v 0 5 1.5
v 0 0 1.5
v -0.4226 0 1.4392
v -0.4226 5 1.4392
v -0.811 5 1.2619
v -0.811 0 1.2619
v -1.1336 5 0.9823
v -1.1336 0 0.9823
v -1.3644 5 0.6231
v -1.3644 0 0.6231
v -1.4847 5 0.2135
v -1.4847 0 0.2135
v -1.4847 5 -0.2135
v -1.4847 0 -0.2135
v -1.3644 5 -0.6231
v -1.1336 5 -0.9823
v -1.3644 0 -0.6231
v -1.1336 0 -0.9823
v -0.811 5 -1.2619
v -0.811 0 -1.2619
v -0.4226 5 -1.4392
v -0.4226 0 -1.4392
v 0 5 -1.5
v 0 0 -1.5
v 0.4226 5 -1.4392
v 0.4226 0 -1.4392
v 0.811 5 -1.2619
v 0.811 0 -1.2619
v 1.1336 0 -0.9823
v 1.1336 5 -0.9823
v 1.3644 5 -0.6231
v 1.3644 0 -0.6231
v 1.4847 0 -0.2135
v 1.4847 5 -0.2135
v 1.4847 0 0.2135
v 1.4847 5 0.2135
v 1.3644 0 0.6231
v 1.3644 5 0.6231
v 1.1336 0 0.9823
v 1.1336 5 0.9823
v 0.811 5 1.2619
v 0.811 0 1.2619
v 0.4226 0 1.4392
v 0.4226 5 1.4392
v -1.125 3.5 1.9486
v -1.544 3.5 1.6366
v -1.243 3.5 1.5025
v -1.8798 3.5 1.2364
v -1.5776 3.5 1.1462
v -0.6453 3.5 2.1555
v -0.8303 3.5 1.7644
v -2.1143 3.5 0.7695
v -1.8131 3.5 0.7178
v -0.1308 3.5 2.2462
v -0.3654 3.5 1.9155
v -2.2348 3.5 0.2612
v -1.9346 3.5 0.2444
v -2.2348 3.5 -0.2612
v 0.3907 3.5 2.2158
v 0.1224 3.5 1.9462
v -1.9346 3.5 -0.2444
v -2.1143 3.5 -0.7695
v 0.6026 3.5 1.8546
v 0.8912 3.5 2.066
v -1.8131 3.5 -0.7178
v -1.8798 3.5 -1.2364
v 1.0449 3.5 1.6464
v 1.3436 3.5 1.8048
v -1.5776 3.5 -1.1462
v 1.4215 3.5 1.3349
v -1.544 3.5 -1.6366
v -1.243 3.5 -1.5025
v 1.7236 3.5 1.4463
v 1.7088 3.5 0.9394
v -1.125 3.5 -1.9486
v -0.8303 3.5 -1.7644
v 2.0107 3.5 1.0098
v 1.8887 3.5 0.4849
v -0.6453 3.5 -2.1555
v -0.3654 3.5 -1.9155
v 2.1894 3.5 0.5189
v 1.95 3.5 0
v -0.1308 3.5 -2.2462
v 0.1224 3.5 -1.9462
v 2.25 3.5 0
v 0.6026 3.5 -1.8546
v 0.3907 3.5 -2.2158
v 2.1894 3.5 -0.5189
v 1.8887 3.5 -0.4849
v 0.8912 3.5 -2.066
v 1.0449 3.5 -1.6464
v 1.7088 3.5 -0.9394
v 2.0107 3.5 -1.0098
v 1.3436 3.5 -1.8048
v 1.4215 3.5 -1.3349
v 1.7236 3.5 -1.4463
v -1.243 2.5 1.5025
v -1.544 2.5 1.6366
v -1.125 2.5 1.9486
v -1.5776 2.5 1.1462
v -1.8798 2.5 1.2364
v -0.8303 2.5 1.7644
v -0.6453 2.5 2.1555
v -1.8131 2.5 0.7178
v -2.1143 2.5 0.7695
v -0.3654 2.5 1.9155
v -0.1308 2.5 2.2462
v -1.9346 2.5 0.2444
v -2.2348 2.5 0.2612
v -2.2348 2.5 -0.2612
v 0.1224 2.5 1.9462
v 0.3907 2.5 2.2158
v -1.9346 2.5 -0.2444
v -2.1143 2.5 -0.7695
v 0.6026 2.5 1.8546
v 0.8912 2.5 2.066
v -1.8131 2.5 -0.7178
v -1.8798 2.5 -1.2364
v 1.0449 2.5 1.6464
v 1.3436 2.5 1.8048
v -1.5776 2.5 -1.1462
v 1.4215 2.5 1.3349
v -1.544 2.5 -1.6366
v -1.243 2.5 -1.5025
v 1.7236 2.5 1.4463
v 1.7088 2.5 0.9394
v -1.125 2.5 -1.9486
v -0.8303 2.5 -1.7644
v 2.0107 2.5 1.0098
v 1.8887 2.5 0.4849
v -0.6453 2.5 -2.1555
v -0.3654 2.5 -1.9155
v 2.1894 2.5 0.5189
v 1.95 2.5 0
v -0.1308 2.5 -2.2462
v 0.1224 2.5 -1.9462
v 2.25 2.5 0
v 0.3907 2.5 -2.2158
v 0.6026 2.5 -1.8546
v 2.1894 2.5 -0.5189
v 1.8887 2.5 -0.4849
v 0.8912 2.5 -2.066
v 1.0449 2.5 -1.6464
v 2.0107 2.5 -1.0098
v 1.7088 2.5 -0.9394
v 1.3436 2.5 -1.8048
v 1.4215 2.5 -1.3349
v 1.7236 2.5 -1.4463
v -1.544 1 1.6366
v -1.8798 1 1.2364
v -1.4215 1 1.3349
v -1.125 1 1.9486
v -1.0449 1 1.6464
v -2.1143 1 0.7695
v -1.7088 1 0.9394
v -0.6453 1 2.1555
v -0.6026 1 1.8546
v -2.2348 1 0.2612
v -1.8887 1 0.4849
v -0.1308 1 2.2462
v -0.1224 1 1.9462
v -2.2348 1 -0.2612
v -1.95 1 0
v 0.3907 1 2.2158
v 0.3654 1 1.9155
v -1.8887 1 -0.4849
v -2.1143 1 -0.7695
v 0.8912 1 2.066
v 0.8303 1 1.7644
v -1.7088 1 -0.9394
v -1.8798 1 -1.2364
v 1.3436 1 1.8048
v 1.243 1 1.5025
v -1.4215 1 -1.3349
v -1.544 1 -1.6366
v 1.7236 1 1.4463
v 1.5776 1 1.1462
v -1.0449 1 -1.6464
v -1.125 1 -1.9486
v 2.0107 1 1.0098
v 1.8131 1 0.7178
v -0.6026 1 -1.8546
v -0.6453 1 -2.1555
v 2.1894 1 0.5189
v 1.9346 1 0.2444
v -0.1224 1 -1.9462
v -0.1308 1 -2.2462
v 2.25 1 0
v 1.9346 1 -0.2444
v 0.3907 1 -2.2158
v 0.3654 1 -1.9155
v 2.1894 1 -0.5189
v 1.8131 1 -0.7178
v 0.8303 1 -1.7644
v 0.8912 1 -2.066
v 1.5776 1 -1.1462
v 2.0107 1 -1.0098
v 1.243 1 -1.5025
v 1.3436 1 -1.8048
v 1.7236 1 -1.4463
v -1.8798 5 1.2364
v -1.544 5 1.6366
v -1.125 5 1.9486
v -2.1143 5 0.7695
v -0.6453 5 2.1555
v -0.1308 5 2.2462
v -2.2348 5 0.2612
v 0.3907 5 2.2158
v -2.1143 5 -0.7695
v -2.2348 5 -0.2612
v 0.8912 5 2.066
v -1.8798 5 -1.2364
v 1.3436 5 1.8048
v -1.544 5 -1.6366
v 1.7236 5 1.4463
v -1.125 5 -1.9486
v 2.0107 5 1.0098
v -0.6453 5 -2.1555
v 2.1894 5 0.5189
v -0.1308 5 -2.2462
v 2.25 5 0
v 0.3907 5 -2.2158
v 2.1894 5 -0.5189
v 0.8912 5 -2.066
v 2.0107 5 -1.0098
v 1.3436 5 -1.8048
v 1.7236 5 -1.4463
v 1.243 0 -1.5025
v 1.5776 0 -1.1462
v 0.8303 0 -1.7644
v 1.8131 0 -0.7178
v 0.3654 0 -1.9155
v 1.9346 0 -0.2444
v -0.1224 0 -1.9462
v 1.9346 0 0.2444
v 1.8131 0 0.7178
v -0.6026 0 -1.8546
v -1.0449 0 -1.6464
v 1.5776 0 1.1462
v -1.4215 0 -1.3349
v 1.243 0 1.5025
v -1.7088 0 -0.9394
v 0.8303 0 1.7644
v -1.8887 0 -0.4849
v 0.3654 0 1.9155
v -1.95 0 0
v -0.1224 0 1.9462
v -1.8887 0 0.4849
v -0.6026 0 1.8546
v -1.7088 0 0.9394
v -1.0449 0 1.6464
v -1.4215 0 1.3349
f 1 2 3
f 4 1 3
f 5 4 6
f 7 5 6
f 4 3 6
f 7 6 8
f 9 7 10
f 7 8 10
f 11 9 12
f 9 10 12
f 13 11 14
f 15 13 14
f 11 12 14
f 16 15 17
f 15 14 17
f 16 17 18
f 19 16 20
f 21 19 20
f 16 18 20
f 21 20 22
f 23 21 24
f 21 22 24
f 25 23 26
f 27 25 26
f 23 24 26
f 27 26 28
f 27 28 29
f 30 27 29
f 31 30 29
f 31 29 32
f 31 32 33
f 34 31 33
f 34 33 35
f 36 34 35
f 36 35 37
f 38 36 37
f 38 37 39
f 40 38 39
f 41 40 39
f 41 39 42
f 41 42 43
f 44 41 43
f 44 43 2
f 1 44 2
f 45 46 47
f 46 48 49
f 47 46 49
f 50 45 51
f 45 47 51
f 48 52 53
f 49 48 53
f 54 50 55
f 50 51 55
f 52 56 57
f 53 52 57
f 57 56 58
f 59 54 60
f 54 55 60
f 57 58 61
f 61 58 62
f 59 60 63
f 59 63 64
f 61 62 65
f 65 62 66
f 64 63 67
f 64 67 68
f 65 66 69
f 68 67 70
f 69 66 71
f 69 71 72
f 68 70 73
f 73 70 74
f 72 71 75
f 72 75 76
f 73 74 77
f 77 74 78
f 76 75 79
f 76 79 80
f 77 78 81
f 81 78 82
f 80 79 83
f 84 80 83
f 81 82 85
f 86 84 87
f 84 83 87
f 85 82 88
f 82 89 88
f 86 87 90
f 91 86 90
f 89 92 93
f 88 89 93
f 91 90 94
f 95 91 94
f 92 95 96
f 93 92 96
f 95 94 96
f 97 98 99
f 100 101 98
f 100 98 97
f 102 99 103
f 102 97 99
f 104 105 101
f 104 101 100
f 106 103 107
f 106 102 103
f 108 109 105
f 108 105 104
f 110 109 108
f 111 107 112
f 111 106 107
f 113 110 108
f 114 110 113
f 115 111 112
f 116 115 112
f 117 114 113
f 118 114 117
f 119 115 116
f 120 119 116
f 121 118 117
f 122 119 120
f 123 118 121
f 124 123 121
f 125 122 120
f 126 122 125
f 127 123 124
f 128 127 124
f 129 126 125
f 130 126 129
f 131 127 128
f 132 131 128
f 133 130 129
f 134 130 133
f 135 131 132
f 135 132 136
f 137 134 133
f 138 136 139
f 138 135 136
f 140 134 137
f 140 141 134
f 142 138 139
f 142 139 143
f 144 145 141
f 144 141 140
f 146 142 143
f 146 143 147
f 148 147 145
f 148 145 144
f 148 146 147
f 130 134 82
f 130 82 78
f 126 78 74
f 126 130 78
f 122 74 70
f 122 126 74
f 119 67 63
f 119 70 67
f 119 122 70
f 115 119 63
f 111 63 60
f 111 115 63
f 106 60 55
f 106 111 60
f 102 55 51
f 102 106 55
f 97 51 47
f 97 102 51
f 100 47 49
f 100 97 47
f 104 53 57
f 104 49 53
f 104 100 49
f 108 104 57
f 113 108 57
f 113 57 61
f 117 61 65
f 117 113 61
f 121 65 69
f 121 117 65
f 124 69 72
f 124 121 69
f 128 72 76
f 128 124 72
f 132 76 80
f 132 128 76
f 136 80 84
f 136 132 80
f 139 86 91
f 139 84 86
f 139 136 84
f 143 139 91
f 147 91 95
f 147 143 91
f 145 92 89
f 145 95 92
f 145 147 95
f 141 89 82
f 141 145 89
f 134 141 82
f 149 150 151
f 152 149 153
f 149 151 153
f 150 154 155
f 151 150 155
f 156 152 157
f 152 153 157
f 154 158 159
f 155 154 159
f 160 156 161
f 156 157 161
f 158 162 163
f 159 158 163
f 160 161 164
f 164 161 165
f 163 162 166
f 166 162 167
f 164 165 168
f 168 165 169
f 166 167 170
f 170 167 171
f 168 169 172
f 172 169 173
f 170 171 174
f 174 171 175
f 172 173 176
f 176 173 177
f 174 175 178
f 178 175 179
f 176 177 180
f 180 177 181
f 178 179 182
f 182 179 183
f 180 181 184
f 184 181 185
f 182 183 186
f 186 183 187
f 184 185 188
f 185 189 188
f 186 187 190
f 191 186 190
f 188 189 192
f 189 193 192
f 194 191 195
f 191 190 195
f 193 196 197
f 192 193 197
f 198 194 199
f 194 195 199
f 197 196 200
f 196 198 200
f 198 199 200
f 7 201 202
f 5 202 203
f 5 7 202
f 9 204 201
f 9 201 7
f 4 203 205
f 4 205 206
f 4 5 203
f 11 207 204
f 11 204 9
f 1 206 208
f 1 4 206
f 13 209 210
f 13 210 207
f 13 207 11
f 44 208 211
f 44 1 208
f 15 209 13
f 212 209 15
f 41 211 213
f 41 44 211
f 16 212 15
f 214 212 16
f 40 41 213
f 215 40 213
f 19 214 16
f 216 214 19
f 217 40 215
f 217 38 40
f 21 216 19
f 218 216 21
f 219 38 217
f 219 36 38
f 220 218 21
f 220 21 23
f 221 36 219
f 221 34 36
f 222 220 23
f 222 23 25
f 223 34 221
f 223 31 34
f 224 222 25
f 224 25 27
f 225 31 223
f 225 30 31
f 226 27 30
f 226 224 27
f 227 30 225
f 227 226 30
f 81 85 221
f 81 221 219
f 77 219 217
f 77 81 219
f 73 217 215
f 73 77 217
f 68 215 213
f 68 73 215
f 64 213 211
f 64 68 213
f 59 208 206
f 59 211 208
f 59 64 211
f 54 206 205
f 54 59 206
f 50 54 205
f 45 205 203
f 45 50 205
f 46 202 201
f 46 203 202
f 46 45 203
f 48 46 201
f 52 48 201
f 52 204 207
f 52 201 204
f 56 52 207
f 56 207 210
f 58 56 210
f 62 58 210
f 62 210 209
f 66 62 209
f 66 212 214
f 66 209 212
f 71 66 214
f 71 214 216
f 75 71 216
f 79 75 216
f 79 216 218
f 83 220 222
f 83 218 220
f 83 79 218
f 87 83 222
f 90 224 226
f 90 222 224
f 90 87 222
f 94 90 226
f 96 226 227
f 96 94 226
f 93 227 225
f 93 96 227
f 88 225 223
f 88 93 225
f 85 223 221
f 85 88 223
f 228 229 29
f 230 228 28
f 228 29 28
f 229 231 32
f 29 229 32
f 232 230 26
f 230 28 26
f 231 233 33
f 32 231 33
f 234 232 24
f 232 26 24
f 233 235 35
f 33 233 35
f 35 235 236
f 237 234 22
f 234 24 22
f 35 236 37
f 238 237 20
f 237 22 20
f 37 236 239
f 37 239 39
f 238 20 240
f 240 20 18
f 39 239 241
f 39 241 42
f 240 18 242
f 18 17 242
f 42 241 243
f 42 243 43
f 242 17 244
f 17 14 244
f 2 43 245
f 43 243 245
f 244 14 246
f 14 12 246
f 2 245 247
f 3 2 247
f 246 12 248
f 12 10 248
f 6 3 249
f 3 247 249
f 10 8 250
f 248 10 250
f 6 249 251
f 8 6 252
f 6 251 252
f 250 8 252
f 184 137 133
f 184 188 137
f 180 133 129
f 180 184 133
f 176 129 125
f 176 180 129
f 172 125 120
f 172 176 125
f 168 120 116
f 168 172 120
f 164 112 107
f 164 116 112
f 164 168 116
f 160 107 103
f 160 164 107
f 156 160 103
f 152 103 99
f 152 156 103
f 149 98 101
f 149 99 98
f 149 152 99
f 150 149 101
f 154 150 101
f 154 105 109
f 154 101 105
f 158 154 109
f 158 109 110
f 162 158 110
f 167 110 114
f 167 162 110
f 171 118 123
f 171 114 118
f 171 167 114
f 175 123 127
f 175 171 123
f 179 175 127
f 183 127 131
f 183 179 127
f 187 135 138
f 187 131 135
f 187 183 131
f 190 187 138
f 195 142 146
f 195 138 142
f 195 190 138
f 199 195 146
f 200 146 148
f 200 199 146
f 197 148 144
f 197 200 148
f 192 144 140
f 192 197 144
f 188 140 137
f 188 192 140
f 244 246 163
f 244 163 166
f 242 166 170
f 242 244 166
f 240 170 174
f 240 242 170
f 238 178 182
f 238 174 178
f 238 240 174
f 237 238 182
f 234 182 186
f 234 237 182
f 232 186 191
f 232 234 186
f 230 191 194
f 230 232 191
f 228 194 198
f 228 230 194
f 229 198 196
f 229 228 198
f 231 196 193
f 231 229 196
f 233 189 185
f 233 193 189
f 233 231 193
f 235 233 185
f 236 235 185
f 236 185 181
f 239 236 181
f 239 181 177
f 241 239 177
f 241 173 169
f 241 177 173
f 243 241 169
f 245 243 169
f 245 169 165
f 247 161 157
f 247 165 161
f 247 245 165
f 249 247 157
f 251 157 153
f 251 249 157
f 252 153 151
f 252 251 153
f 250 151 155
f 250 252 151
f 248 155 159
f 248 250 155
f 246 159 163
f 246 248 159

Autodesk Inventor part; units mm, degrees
ref_plane "YZ Plane" through (0, 0, 0) normal (1, 0, 0) x (0, 1, 0)
ref_plane "XZ Plane" through (0, 0, 0) normal (0, 1, 0) x (-1, 0, 0)
ref_plane "XY Plane" through (0, 0, 0) normal (0, 0, 1) x (1, 0, 0)
sketch "Boceto1" plane through (0, 0, 0) normal (0, 1, 0) x (-1, 0, 0)
  circle A0 centre (0, 0) radius 1.95
  dimension "d0" = 3.9
extrude "Extrusión1" add sketch "Boceto1" along normal blind 1
sketch "Boceto2" plane through (0, 1, 0) normal (0, 1, 0) x (1, 0, 0)
  circle A0 centre (0, 0) radius 2.25
  dimension "d3" = 4.5
extrude "Extrusión2" add sketch "Boceto2" along normal blind 1.5
sketch "Boceto3" plane through (0, 2.5, 0) normal (0, 1, 0) x (1, 0, 0)
  circle A0 centre (0, 0) radius 1.95
  dimension "d8" = 3.9
extrude "Extrusión3" add sketch "Boceto3" along normal blind 1
sketch "Boceto4" plane through (0, 3.5, 0) normal (0, 1, 0) x (1, 0, 0)
  circle A0 centre (0, 0) radius 2.25 projected
  circle A1 centre (0, 0) radius 2.25
extrude "Extrusión4" add sketch "Boceto4" along normal blind 1.5
sketch "Boceto5" plane through (0, 5, 0) normal (0, 1, 0) x (1, 0, 0)
  point P0 (0, 0)
  point P1 (0, 0)
hole "Agujero1" at (0, 5, 0) direction (0, -1, 0) diameter 3 depth 6
thread "Rosca1" size "M3x0.5" class "6H" standard "ANSI Metric M Profile" full length
properties part number "InsertoM3" material "Latón, amarillo claro"
